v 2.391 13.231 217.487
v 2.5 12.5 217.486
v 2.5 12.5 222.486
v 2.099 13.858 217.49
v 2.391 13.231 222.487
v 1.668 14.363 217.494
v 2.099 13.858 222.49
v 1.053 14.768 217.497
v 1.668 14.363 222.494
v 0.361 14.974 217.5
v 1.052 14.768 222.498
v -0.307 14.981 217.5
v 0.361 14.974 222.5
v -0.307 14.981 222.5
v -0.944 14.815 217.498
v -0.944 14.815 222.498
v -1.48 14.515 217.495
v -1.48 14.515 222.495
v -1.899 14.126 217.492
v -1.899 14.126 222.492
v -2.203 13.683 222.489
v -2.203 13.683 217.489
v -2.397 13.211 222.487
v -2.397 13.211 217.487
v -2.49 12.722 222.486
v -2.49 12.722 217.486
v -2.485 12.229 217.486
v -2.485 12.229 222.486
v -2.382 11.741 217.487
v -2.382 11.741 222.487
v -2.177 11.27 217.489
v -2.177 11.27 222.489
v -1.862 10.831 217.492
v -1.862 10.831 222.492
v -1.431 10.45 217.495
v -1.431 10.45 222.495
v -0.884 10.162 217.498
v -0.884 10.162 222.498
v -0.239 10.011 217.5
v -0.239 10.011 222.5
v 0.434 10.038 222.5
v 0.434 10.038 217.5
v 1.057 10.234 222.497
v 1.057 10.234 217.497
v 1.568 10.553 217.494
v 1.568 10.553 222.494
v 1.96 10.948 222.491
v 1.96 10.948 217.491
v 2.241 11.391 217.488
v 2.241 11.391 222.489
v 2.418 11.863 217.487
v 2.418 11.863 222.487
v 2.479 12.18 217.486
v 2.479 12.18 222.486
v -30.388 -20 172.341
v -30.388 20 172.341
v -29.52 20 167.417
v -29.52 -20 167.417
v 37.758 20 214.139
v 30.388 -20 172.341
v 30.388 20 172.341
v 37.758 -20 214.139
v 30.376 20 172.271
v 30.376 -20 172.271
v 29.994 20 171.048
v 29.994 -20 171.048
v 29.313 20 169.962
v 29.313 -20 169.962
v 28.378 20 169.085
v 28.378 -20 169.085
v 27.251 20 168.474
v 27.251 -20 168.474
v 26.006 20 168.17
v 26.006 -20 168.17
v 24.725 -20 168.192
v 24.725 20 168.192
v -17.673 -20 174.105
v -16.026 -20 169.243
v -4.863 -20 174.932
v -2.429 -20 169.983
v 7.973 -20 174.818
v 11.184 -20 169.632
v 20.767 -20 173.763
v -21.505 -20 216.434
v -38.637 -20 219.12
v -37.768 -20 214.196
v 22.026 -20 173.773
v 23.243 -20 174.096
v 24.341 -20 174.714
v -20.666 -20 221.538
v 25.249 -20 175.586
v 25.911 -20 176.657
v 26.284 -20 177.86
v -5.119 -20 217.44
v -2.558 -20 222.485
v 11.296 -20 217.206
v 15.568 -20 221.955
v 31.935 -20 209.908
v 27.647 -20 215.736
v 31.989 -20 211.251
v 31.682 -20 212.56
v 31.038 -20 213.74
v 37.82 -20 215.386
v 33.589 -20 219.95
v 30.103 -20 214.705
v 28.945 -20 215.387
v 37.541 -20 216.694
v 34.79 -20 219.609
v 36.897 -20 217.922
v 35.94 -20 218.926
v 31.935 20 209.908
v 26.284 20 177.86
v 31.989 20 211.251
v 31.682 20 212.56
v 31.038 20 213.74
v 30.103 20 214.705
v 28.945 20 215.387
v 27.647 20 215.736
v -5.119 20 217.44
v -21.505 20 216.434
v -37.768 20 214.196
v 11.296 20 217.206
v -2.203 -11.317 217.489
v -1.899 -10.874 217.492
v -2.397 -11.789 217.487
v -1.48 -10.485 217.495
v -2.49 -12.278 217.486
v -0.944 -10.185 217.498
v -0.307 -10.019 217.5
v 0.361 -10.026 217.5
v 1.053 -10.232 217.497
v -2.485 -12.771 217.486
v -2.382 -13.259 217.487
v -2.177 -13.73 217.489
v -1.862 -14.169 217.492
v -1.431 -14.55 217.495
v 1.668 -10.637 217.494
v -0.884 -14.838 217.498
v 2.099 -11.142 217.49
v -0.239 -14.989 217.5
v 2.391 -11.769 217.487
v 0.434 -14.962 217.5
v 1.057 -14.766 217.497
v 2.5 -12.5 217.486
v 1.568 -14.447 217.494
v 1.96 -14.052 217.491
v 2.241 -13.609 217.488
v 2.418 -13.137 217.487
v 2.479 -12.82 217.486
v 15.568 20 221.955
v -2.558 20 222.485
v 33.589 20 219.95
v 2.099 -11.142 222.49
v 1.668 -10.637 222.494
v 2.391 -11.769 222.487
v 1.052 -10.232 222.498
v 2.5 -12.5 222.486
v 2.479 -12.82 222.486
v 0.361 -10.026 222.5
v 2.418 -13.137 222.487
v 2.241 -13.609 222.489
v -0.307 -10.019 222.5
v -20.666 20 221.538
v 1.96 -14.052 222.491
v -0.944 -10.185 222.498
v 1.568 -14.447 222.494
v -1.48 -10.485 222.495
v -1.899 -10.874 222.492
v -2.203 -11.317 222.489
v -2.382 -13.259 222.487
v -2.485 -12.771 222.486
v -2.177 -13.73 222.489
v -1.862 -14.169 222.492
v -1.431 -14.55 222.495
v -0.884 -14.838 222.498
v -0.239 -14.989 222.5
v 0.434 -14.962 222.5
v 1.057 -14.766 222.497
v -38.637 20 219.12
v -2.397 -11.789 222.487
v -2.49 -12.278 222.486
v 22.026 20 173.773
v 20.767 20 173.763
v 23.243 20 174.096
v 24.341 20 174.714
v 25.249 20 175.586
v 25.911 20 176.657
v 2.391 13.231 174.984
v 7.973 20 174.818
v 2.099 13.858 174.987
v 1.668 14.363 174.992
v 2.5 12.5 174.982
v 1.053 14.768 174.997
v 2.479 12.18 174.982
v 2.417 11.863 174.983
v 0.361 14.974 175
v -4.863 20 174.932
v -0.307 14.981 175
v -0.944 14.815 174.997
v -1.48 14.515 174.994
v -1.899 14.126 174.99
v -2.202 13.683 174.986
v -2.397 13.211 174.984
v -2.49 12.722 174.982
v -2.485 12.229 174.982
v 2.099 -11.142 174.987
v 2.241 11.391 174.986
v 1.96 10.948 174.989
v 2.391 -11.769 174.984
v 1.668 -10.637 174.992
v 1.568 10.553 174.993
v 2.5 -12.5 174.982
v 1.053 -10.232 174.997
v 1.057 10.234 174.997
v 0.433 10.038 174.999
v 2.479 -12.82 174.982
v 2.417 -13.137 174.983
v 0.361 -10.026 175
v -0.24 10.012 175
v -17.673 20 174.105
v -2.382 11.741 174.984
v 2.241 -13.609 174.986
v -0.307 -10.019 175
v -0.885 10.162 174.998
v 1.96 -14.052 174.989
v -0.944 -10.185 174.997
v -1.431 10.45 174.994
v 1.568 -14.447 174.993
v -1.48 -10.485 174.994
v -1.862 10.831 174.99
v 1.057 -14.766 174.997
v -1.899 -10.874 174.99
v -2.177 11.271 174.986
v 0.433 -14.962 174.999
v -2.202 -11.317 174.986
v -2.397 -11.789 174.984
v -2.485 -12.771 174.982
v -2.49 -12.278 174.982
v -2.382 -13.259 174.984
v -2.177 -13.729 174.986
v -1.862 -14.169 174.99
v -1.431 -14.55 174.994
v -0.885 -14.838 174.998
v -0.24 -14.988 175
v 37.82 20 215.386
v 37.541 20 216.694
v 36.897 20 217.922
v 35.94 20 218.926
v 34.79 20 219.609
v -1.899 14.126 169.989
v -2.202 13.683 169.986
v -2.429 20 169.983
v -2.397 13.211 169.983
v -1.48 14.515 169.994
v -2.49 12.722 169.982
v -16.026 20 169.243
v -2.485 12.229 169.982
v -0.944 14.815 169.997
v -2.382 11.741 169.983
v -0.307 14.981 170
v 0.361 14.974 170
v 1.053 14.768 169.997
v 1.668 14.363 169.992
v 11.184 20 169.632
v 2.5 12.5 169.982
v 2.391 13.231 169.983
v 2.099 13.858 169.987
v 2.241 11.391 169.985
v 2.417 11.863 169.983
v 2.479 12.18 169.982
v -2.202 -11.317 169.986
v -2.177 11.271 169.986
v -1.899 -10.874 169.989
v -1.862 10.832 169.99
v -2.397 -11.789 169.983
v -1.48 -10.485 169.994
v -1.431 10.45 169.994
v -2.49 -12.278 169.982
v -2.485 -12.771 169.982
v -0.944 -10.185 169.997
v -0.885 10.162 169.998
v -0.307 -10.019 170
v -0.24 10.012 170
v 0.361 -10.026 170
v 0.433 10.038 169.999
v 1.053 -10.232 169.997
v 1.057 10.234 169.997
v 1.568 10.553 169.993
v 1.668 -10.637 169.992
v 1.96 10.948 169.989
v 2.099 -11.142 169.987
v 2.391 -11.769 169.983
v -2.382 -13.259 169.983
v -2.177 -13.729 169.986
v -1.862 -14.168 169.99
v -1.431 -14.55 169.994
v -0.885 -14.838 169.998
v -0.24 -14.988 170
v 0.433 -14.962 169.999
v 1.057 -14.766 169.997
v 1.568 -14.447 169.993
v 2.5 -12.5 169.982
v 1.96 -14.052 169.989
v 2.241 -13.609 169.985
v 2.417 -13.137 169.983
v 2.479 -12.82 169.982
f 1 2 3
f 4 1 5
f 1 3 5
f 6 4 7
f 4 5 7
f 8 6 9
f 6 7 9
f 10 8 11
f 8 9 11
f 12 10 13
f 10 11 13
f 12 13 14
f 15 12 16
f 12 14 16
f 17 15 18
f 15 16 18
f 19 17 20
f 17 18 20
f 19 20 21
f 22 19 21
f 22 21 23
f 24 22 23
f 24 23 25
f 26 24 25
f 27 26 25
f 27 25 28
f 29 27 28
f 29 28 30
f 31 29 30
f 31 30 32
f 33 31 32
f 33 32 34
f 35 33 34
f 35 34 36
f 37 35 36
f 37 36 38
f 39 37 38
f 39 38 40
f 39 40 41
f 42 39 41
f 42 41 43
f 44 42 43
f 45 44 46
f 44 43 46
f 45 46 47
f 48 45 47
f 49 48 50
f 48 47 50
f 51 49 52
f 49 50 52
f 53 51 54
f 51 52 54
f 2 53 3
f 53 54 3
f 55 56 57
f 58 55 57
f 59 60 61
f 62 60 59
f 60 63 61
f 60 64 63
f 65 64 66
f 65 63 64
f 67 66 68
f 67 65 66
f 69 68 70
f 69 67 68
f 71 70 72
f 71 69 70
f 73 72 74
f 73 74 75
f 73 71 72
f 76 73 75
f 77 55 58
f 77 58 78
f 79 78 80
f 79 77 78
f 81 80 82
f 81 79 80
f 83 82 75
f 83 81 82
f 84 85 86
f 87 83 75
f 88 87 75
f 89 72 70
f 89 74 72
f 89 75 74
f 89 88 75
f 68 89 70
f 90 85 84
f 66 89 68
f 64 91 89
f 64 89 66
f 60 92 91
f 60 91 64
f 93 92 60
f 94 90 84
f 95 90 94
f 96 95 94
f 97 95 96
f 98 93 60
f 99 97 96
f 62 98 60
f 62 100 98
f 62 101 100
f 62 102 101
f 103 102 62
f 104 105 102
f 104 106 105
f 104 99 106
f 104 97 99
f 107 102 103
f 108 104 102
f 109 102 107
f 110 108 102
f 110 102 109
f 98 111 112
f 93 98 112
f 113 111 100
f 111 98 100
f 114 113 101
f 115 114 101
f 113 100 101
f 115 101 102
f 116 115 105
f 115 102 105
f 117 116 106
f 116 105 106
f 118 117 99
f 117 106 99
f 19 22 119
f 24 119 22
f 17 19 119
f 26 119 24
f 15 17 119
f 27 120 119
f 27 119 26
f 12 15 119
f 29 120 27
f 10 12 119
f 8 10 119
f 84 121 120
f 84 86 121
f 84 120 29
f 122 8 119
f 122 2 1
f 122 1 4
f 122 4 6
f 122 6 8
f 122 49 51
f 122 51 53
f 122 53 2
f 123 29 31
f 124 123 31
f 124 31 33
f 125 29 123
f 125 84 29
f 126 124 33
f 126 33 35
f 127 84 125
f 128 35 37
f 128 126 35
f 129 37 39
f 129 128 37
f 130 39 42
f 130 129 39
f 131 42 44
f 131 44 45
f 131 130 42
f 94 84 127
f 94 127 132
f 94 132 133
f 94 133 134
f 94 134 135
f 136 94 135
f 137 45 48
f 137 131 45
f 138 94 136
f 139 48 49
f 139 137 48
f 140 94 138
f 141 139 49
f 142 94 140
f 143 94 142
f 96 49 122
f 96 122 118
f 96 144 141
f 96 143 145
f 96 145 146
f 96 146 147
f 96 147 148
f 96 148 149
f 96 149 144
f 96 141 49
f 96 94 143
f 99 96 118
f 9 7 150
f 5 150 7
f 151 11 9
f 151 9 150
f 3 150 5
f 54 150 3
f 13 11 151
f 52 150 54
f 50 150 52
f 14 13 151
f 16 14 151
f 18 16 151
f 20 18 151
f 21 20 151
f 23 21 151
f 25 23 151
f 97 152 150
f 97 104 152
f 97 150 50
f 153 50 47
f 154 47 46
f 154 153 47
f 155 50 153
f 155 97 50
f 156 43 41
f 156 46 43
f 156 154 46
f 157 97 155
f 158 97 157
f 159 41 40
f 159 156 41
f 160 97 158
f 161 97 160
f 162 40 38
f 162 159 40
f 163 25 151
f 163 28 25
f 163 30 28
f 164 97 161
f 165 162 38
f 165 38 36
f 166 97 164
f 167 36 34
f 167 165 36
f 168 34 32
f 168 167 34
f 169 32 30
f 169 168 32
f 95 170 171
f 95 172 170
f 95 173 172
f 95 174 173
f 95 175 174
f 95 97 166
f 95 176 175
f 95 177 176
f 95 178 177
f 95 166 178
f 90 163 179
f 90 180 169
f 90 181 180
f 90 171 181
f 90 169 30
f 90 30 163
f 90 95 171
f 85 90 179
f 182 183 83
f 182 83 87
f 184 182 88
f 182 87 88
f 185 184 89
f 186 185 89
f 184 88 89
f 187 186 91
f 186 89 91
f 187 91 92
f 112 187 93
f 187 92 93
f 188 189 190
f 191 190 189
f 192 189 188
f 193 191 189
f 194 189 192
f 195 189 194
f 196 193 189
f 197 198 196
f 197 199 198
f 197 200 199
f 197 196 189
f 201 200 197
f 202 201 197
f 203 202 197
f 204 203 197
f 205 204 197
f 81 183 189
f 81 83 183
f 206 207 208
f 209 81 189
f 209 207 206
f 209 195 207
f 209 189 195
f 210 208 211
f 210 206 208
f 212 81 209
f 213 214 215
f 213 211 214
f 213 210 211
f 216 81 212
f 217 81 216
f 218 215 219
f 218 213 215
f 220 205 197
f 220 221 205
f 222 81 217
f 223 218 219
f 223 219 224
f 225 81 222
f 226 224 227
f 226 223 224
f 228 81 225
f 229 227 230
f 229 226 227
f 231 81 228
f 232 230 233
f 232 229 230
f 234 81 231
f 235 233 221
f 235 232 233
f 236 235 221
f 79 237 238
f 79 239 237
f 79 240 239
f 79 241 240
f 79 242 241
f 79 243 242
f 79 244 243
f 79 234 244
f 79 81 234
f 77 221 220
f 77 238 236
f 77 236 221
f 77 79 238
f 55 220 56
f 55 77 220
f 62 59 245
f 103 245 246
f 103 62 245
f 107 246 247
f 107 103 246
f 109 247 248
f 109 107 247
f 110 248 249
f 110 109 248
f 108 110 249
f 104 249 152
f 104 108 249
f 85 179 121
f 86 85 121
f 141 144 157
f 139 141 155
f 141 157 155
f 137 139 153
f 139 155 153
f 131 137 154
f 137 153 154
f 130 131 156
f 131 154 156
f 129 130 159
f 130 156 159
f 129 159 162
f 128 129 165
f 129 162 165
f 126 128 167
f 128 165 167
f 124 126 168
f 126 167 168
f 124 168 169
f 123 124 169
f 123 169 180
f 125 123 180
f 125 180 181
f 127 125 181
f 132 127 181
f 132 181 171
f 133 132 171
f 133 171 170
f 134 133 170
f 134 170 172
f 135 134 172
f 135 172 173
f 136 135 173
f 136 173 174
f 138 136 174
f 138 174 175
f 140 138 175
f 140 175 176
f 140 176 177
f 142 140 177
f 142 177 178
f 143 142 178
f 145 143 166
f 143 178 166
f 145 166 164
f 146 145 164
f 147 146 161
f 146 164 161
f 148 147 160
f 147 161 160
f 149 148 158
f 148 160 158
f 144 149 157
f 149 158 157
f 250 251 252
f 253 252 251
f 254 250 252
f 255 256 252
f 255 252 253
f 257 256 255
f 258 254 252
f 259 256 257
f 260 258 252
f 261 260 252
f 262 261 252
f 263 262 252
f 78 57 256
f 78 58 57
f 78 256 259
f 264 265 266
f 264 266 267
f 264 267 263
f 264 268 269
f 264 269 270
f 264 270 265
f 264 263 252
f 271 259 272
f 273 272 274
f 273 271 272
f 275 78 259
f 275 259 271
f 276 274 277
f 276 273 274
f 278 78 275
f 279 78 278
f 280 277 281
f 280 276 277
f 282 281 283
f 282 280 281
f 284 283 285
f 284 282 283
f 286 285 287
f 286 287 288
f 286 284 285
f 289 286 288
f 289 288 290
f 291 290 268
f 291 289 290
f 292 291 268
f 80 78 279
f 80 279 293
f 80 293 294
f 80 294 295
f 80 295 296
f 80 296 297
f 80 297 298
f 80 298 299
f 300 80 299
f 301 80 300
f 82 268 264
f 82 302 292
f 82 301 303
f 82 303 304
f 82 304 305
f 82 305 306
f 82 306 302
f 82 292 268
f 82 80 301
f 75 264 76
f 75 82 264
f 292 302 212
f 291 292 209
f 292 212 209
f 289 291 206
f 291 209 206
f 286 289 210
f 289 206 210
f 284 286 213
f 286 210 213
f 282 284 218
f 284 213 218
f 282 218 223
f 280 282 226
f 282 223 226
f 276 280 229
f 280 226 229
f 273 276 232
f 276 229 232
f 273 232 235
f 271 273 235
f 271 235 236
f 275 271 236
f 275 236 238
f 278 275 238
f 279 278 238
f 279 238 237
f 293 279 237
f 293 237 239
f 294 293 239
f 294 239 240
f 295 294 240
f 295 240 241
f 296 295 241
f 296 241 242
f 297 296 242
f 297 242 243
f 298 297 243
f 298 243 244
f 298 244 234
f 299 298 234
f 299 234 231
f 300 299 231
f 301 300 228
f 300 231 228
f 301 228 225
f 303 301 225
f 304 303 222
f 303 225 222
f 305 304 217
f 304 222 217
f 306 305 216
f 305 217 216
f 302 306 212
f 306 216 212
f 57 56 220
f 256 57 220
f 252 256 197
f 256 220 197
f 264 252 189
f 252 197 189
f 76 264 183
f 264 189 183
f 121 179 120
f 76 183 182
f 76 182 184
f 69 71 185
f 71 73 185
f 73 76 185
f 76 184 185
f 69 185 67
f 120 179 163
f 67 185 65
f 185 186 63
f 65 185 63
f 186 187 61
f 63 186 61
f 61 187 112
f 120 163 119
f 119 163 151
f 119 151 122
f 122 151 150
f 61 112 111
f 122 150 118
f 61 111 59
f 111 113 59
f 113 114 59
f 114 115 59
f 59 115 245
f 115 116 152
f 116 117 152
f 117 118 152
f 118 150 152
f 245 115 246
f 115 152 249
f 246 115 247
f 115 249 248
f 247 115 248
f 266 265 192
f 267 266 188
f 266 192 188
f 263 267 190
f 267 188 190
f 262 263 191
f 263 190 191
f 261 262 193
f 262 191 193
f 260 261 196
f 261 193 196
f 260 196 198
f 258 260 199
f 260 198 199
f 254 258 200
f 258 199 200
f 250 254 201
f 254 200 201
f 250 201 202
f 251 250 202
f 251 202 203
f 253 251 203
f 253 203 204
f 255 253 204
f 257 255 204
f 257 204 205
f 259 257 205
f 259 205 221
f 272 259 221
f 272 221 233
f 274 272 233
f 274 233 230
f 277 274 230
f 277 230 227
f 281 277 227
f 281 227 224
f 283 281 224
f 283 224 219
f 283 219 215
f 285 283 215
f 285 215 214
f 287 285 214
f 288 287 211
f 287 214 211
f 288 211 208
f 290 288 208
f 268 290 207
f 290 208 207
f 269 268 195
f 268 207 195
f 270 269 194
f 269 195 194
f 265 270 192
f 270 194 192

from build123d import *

# Parameters (mm, degrees)
F1_DEPTH = 20
F2_R     = 5
F4_R     = 2.5
F5_DEPTH = 62.5836819879


with BuildPart() as f1:
    # F0 (on Front) → F1 (new body, symmetric)
    with BuildSketch(Plane.XZ):
        with BuildLine():
            Line((37.7684786426, 214.1956862802), (38.6367195309, 219.1197250452))
            ThreePointArc((38.6367195309, 219.1197250452), (0, 222.5), (-38.6367195309, 219.1197250452))
            Line((-38.6367195309, 219.1197250452), (-37.7684786426, 214.1956862802))
            ThreePointArc((-37.7684786426, 214.1956862802), (-2.5001651855, 217.4856298104), (32.8344587783, 215.0073215422))
            ThreePointArc((32.8344587783, 215.0073215422), (35.3038012268, 214.6156835344), (37.7684786426, 214.1956862802))
        make_face()
        with BuildLine():
            Line((30.3884310917, 172.3413567771), (37.7684786426, 214.1956862802))
            ThreePointArc((37.7684786426, 214.1956862802), (35.3038012268, 214.6156835344), (32.8344587783, 215.0073215422))
            Line((32.8344587783, 215.0073215422), (25.451986353, 173.1392398929))
            ThreePointArc((25.451986353, 173.1392398929), (27.9230587413, 172.7579311943), (30.3884310917, 172.3413567771))
        make_face()
        with BuildLine():
            Line((29.5201902034, 167.4173180121), (30.3884310917, 172.3413567771))
            ThreePointArc((30.3884310917, 172.3413567771), (27.9230587413, 172.7579311943), (25.451986353, 173.1392398929))
            ThreePointArc((25.451986353, 173.1392398929), (-2.5002551932, 174.9821382998), (-30.3884310917, 172.3413567771))
            Line((-30.3884310917, 172.3413567771), (-29.5201902034, 167.4173180121))
            ThreePointArc((-29.5201902034, 167.4173180121), (0, 170), (29.5201902034, 167.4173180121))
        make_face()
    extrude(amount=F1_DEPTH, both=True)

    # F2
    f2_edges = [f1.edges().sort_by_distance(p)[0] for p in [
        (38.63672, 0, 219.119725),
        (32.834459, 0, 215.007322),
        (29.52019, 0, 167.417318),
        (25.451986, 0, 173.13924),
    ]]
    fillet(f2_edges, radius=F2_R)

    # F4 (on offset) → F5 (cut, through all)
    with BuildSketch(Plane.XY.offset(230)):
        with Locations((0, 12.5)):
            Circle(F4_R)
        with Locations((0, -12.5)):
            Circle(F4_R)
    extrude(amount=-F5_DEPTH, mode=Mode.SUBTRACT)


solid = f1.part
